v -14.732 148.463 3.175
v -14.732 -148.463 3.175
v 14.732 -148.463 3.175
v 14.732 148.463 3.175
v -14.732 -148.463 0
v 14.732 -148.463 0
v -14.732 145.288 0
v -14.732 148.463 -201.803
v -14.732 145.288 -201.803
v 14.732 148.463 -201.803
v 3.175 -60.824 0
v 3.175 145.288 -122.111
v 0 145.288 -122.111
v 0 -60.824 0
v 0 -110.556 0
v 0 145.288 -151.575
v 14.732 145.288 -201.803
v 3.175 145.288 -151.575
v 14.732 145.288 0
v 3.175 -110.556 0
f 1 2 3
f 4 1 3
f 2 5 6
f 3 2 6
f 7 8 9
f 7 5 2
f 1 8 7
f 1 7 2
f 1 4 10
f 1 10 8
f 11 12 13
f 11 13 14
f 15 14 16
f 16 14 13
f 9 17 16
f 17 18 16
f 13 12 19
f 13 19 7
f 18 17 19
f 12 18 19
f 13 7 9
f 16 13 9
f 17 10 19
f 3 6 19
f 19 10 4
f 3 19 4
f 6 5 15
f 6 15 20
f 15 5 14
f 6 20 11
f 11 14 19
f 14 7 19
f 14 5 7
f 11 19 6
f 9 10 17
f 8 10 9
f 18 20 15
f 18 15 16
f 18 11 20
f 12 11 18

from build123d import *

# Parameters (mm, degrees)
F0_W     = 29.464
F0_H     = 296.926
F1_DEPTH = 3.175
F2_W     = 29.464
F2_H     = 204.978
F3_DEPTH = 3.175
F6_DEPTH = 3.175


with BuildPart() as f1:
    # F0 (on Top) → F1 (new body)
    with BuildSketch(Plane.XY):
        Rectangle(F0_W, F0_H)
    extrude(amount=F1_DEPTH)

    # F2 (on face) → F3 (join)
    with BuildSketch(Plane(origin=(0, 148.463, 0), x_dir=(-1, 0, 0), z_dir=(0, 1, 0))):
        with Locations((0, -99.314)):
            Rectangle(F2_W, F2_H)
    extrude(amount=-F3_DEPTH)

    # F5 (on offset) → F6 (join)
    with BuildSketch(Plane.YZ.offset(3.175)):
        Polygon((145.288, -151.575044), (145.288, -122.111044), (-60.823944, 0), (-110.556401, 0), align=None)
    extrude(amount=-F6_DEPTH)


solid = f1.part
